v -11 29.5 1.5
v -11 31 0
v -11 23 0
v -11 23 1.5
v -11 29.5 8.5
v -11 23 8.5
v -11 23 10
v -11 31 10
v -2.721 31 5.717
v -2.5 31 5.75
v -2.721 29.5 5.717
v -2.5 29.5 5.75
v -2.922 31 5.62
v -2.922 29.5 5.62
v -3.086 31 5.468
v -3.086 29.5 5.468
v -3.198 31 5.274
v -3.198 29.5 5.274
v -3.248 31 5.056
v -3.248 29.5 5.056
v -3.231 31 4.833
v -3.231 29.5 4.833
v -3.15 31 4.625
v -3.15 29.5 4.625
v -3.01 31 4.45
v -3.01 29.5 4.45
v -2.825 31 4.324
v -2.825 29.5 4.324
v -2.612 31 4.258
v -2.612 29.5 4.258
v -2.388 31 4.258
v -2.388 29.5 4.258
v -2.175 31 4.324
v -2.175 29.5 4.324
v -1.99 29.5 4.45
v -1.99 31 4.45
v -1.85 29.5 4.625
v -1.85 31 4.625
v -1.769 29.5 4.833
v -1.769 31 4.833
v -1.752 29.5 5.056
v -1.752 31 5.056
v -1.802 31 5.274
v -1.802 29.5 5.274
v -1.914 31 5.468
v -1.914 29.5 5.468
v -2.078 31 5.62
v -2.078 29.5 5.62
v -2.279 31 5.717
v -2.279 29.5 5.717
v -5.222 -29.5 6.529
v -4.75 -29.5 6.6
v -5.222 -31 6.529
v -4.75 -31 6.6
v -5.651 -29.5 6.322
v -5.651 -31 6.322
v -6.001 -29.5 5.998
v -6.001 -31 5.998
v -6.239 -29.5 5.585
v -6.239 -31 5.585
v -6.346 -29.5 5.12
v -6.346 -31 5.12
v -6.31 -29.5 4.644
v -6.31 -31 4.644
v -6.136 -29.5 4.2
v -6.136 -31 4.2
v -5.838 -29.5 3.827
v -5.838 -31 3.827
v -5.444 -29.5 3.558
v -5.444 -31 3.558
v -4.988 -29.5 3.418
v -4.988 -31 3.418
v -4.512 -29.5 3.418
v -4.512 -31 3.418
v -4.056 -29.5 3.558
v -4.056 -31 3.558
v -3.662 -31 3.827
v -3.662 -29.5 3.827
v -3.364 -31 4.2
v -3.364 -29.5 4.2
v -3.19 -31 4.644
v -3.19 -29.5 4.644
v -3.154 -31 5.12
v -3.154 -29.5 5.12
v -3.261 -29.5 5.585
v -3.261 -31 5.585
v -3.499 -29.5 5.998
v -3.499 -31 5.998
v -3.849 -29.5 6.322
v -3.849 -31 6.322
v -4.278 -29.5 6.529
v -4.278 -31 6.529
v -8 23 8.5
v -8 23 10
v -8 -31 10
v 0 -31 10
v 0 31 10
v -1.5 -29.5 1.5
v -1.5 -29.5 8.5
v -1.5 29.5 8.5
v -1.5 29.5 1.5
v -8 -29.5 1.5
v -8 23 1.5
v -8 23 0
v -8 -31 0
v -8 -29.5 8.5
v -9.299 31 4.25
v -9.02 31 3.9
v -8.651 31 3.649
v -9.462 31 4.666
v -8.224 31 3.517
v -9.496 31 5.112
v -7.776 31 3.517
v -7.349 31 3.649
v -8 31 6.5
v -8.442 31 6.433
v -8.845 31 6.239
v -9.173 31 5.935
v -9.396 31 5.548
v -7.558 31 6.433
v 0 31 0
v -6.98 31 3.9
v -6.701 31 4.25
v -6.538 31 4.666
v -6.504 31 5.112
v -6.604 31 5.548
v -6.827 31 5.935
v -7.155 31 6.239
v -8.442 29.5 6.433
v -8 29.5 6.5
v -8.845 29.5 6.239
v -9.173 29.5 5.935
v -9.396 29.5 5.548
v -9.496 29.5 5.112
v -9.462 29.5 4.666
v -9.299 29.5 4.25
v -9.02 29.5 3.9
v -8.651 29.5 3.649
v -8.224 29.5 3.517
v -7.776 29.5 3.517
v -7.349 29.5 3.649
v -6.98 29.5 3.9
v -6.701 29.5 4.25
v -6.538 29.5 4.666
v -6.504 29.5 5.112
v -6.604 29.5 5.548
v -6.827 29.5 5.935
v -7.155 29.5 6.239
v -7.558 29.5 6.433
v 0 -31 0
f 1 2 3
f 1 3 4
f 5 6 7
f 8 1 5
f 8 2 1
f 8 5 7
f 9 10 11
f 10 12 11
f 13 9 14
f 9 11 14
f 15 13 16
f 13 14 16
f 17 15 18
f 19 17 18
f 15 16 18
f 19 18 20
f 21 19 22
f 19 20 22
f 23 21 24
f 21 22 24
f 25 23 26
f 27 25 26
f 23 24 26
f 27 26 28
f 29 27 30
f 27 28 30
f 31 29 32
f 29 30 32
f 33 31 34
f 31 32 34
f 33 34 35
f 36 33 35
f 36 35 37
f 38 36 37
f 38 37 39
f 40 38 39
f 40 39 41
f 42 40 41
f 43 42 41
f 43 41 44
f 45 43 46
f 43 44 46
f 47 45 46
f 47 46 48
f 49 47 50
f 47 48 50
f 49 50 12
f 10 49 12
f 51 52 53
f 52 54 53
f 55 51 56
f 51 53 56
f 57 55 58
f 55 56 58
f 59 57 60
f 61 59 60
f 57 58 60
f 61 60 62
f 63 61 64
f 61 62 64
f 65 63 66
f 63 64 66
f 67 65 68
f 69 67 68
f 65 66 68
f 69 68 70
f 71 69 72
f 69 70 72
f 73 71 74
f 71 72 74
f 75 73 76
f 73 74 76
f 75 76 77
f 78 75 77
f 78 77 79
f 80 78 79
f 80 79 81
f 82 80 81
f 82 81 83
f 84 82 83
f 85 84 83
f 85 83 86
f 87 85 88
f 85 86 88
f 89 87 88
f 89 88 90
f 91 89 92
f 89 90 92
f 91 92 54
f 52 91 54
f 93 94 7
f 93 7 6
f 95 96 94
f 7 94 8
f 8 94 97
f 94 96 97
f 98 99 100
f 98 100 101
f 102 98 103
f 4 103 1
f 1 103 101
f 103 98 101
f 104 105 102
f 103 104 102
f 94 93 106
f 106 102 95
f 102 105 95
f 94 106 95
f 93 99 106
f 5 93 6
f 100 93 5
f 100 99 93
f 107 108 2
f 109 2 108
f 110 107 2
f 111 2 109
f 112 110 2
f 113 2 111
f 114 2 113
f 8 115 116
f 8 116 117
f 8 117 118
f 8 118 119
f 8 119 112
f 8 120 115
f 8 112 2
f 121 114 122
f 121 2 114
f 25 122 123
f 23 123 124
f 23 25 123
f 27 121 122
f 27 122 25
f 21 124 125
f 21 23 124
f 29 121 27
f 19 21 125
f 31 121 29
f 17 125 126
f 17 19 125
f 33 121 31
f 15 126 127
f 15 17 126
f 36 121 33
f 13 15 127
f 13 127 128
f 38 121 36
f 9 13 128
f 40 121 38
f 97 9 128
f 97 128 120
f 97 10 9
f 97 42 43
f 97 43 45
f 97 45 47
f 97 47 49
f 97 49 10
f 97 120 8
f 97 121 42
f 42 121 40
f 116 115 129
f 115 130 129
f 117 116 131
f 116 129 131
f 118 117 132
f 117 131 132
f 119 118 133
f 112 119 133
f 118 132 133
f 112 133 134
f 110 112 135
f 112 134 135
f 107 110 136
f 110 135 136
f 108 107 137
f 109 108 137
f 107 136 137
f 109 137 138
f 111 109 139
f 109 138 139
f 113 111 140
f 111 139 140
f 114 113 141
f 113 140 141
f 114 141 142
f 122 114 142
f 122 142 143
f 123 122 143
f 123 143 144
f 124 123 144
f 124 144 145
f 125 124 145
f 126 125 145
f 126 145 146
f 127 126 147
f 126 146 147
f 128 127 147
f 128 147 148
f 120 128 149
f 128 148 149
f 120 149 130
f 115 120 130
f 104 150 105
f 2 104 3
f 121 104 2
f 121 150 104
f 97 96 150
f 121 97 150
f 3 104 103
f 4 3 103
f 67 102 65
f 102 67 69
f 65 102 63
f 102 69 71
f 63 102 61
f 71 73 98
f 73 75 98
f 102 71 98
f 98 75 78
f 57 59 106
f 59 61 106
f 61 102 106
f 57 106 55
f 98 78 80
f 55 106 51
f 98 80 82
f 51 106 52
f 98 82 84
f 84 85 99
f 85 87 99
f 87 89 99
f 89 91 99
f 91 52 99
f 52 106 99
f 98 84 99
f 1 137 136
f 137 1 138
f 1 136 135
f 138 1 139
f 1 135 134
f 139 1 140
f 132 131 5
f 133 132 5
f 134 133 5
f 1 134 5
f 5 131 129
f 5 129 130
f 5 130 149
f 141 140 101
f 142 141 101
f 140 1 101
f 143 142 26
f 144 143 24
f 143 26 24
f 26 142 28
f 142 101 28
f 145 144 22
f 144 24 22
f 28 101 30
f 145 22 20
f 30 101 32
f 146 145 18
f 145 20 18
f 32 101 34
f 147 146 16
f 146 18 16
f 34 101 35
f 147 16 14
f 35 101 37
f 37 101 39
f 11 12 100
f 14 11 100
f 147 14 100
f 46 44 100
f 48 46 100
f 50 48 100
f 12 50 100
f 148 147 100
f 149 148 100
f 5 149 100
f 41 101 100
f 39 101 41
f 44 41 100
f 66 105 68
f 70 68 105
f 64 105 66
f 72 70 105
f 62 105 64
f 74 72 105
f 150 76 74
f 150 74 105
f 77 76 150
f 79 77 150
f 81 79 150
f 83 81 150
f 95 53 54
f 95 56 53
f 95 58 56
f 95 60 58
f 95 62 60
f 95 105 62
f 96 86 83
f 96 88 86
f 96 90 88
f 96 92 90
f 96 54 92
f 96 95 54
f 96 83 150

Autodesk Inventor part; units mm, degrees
ref_plane "YZ Plane" through (0, 0, 0) normal (1, 0, 0) x (0, 1, 0)
ref_plane "XZ Plane" through (0, 0, 0) normal (0, 1, 0) x (-1, 0, 0)
ref_plane "XY Plane" through (0, 0, 0) normal (0, 0, 1) x (1, 0, 0)
sketch "Náčrt1" plane through (0, 0, 0) normal (0, 1, 0) x (-1, 0, 0)
  line L0 (0, -2) -> (0, 12) projected
  line L1 (-1.6, 0) -> (9.6, 0) projected
  line L2 (8, 10) -> (0, 10)
  line L3 (0, 10) -> (0, 0)
  line L4 (0, 0) -> (8, 0)
  line L5 (8, 0) -> (8, 10)
  line L6 (8, 8.5) -> (1.5, 8.5)
  line L7 (1.5, 8.5) -> (1.5, 1.5)
  line L8 (1.5, 1.5) -> (8, 1.5)
  line L9 (8, 1.5) -> (8, 8.5)
  point P0 (0, 0)
  point P1 (0, 10)
  dimension "d0" = 8
  dimension "d1" = 10
  dimension "d2" = 6.5
  dimension "d3" = 7
  dimension "d4" = 1.5
extrude "Vysunutí1" add sketch "Náčrt1" along normal mid plane 59 contours L0 L2 L5 L6 L7 L8 L1
sketch "Náčrt2" plane through (0, -29.5, 0) normal (0, -1, 0) x (1, 0, 0)
  line L0 (-8, 8.5) -> (-1.5, 8.5) projected
  line L1 (-1.5, 8.5) -> (-1.5, 1.5) projected
  line L2 (-1.5, 1.5) -> (-8, 1.5) projected
  line L3 (-8, 1.5) -> (-8, 0) projected
  line L4 (-8, 0) -> (0, 0) projected
  line L5 (0, 0) -> (0, 10) projected
  line L6 (0, 10) -> (-8, 10) projected
  line L7 (-8, 10) -> (-8, 8.5) projected
  line L8 (-8, 10) -> (0, 10)
  line L9 (0, 10) -> (0, 0)
  line L10 (0, 0) -> (-8, 0)
  line L11 (-8, 0) -> (-8, 10)
extrude "Vysunutí2" add sketch "Náčrt2" along normal blind 1.5
sketch "Náčrt3" plane through (0, -29.5, 0) normal (0, 1, 0) x (1, 0, 0)
  line L0 (-8, -8.5) -> (-1.5, -8.5) projected
  line L1 (-1.5, -8.5) -> (-1.5, -1.5) projected
  line L2 (-1.5, -1.5) -> (-8, -1.5) projected
  line L3 (-8, -8.5) -> (-8, -1.5) projected
  point P0 (0, 0)
  point P1 (-4.75, -5)
  dimension "d9" = 3.25
  dimension "d10" = 3.5
hole "Díra1" at (-4.75, -29.5, 5) direction (0, -1, 0) diameter 3.2 end through all
sketch "Náčrt5" plane through (0, 29.5, 0) normal (0, 1, 0) x (1, 0, 0)
  line L0 (0, -10) -> (-8, -10) projected
  line L1 (0, 0) -> (-8, 0)
  line L2 (-8, 0) -> (-8, -10)
  line L3 (-8, -10) -> (0, -10)
  line L4 (0, -10) -> (0, 0)
extrude "Vysunutí3" add sketch "Náčrt5" along normal blind 1.5
sketch "Náčrt6" plane through (-8, -31, 0) normal (-1, 0, 0) x (0, 0, 1)
  line L0 (0, 0) -> (0, 62) projected
  line L1 (0, 62) -> (0, 54)
  line L2 (0, 54) -> (1.5, 54)
  line L3 (1.5, 1.5) -> (1.5, 60.5) projected
  line L4 (1.5, 60.5) -> (1.5, 54)
  line L5 (0, 0) -> (0, 62) projected
  line L6 (10, 0) -> (0, 0) projected
  line L7 (10, 0) -> (10, 62) projected
  line L8 (0, 62) -> (10, 62) projected
  line L9 (1.5, 60.5) -> (8.5, 60.5) projected
  line L10 (8.5, 1.5) -> (8.5, 60.5) projected
  line L11 (8.5, 1.5) -> (1.5, 1.5) projected
  line L12 (1.5, 1.5) -> (1.5, 60.5) projected
  line L13 (1.5, 60.5) -> (8.5, 60.5)
  line L14 (8.5, 60.5) -> (8.5, 54)
  line L15 (8.5, 60.5) -> (8.5, 1.5) projected
  line L16 (10, 54) -> (8.5, 54)
  line L17 (10, 54) -> (10, 62)
  line L18 (0, 62) -> (10, 62)
  point P0 (0, 31)
  dimension "d31" = 8
  dimension "d32" = 8
extrude "Vysunutí4" add sketch "Náčrt6" along normal blind 3 contours L0 L8 L7 L16 L10 L9 L3 L2
sketch "Náčrt7" plane through (0, 31, 0) normal (0, 1, 0) x (1, 0, 0)
  line L0 (0, -10) -> (-11, -10) projected
  line L1 (0, -10) -> (0, 0) projected
  line L2 (0, 0) -> (-11, 0) projected
  line L3 (-11, -10) -> (-11, 0) projected
  point P0 (-2.5, -5)
  dimension "d35" = 2.5
  dimension "d37" = 5
hole "Díra3" at (-2.5, 31, 5) direction (0, -1, 0) diameter 1.5 depth 1.5
sketch "Náčrt8" plane through (0, 31, 0) normal (0, 1, 0) x (1, 0, 0)
  circle A0 centre (-2.5, -5) radius 0.75 projected
  line L0 (0, -10) -> (-11, -10) projected
  line L1 (0, -10) -> (0, 0) projected
  line L2 (0, 0) -> (-11, 0) projected
  line L3 (-11, -10) -> (-11, 0) projected
  point P0 (-8, -5)
  dimension "d45" = 3
  dimension "d46" = 5
hole "Díra4" at (-8, 31, 5) direction (0, -1, 0) diameter 3 depth 1.5
properties part number "head_arm" material "Hliník 6061"
